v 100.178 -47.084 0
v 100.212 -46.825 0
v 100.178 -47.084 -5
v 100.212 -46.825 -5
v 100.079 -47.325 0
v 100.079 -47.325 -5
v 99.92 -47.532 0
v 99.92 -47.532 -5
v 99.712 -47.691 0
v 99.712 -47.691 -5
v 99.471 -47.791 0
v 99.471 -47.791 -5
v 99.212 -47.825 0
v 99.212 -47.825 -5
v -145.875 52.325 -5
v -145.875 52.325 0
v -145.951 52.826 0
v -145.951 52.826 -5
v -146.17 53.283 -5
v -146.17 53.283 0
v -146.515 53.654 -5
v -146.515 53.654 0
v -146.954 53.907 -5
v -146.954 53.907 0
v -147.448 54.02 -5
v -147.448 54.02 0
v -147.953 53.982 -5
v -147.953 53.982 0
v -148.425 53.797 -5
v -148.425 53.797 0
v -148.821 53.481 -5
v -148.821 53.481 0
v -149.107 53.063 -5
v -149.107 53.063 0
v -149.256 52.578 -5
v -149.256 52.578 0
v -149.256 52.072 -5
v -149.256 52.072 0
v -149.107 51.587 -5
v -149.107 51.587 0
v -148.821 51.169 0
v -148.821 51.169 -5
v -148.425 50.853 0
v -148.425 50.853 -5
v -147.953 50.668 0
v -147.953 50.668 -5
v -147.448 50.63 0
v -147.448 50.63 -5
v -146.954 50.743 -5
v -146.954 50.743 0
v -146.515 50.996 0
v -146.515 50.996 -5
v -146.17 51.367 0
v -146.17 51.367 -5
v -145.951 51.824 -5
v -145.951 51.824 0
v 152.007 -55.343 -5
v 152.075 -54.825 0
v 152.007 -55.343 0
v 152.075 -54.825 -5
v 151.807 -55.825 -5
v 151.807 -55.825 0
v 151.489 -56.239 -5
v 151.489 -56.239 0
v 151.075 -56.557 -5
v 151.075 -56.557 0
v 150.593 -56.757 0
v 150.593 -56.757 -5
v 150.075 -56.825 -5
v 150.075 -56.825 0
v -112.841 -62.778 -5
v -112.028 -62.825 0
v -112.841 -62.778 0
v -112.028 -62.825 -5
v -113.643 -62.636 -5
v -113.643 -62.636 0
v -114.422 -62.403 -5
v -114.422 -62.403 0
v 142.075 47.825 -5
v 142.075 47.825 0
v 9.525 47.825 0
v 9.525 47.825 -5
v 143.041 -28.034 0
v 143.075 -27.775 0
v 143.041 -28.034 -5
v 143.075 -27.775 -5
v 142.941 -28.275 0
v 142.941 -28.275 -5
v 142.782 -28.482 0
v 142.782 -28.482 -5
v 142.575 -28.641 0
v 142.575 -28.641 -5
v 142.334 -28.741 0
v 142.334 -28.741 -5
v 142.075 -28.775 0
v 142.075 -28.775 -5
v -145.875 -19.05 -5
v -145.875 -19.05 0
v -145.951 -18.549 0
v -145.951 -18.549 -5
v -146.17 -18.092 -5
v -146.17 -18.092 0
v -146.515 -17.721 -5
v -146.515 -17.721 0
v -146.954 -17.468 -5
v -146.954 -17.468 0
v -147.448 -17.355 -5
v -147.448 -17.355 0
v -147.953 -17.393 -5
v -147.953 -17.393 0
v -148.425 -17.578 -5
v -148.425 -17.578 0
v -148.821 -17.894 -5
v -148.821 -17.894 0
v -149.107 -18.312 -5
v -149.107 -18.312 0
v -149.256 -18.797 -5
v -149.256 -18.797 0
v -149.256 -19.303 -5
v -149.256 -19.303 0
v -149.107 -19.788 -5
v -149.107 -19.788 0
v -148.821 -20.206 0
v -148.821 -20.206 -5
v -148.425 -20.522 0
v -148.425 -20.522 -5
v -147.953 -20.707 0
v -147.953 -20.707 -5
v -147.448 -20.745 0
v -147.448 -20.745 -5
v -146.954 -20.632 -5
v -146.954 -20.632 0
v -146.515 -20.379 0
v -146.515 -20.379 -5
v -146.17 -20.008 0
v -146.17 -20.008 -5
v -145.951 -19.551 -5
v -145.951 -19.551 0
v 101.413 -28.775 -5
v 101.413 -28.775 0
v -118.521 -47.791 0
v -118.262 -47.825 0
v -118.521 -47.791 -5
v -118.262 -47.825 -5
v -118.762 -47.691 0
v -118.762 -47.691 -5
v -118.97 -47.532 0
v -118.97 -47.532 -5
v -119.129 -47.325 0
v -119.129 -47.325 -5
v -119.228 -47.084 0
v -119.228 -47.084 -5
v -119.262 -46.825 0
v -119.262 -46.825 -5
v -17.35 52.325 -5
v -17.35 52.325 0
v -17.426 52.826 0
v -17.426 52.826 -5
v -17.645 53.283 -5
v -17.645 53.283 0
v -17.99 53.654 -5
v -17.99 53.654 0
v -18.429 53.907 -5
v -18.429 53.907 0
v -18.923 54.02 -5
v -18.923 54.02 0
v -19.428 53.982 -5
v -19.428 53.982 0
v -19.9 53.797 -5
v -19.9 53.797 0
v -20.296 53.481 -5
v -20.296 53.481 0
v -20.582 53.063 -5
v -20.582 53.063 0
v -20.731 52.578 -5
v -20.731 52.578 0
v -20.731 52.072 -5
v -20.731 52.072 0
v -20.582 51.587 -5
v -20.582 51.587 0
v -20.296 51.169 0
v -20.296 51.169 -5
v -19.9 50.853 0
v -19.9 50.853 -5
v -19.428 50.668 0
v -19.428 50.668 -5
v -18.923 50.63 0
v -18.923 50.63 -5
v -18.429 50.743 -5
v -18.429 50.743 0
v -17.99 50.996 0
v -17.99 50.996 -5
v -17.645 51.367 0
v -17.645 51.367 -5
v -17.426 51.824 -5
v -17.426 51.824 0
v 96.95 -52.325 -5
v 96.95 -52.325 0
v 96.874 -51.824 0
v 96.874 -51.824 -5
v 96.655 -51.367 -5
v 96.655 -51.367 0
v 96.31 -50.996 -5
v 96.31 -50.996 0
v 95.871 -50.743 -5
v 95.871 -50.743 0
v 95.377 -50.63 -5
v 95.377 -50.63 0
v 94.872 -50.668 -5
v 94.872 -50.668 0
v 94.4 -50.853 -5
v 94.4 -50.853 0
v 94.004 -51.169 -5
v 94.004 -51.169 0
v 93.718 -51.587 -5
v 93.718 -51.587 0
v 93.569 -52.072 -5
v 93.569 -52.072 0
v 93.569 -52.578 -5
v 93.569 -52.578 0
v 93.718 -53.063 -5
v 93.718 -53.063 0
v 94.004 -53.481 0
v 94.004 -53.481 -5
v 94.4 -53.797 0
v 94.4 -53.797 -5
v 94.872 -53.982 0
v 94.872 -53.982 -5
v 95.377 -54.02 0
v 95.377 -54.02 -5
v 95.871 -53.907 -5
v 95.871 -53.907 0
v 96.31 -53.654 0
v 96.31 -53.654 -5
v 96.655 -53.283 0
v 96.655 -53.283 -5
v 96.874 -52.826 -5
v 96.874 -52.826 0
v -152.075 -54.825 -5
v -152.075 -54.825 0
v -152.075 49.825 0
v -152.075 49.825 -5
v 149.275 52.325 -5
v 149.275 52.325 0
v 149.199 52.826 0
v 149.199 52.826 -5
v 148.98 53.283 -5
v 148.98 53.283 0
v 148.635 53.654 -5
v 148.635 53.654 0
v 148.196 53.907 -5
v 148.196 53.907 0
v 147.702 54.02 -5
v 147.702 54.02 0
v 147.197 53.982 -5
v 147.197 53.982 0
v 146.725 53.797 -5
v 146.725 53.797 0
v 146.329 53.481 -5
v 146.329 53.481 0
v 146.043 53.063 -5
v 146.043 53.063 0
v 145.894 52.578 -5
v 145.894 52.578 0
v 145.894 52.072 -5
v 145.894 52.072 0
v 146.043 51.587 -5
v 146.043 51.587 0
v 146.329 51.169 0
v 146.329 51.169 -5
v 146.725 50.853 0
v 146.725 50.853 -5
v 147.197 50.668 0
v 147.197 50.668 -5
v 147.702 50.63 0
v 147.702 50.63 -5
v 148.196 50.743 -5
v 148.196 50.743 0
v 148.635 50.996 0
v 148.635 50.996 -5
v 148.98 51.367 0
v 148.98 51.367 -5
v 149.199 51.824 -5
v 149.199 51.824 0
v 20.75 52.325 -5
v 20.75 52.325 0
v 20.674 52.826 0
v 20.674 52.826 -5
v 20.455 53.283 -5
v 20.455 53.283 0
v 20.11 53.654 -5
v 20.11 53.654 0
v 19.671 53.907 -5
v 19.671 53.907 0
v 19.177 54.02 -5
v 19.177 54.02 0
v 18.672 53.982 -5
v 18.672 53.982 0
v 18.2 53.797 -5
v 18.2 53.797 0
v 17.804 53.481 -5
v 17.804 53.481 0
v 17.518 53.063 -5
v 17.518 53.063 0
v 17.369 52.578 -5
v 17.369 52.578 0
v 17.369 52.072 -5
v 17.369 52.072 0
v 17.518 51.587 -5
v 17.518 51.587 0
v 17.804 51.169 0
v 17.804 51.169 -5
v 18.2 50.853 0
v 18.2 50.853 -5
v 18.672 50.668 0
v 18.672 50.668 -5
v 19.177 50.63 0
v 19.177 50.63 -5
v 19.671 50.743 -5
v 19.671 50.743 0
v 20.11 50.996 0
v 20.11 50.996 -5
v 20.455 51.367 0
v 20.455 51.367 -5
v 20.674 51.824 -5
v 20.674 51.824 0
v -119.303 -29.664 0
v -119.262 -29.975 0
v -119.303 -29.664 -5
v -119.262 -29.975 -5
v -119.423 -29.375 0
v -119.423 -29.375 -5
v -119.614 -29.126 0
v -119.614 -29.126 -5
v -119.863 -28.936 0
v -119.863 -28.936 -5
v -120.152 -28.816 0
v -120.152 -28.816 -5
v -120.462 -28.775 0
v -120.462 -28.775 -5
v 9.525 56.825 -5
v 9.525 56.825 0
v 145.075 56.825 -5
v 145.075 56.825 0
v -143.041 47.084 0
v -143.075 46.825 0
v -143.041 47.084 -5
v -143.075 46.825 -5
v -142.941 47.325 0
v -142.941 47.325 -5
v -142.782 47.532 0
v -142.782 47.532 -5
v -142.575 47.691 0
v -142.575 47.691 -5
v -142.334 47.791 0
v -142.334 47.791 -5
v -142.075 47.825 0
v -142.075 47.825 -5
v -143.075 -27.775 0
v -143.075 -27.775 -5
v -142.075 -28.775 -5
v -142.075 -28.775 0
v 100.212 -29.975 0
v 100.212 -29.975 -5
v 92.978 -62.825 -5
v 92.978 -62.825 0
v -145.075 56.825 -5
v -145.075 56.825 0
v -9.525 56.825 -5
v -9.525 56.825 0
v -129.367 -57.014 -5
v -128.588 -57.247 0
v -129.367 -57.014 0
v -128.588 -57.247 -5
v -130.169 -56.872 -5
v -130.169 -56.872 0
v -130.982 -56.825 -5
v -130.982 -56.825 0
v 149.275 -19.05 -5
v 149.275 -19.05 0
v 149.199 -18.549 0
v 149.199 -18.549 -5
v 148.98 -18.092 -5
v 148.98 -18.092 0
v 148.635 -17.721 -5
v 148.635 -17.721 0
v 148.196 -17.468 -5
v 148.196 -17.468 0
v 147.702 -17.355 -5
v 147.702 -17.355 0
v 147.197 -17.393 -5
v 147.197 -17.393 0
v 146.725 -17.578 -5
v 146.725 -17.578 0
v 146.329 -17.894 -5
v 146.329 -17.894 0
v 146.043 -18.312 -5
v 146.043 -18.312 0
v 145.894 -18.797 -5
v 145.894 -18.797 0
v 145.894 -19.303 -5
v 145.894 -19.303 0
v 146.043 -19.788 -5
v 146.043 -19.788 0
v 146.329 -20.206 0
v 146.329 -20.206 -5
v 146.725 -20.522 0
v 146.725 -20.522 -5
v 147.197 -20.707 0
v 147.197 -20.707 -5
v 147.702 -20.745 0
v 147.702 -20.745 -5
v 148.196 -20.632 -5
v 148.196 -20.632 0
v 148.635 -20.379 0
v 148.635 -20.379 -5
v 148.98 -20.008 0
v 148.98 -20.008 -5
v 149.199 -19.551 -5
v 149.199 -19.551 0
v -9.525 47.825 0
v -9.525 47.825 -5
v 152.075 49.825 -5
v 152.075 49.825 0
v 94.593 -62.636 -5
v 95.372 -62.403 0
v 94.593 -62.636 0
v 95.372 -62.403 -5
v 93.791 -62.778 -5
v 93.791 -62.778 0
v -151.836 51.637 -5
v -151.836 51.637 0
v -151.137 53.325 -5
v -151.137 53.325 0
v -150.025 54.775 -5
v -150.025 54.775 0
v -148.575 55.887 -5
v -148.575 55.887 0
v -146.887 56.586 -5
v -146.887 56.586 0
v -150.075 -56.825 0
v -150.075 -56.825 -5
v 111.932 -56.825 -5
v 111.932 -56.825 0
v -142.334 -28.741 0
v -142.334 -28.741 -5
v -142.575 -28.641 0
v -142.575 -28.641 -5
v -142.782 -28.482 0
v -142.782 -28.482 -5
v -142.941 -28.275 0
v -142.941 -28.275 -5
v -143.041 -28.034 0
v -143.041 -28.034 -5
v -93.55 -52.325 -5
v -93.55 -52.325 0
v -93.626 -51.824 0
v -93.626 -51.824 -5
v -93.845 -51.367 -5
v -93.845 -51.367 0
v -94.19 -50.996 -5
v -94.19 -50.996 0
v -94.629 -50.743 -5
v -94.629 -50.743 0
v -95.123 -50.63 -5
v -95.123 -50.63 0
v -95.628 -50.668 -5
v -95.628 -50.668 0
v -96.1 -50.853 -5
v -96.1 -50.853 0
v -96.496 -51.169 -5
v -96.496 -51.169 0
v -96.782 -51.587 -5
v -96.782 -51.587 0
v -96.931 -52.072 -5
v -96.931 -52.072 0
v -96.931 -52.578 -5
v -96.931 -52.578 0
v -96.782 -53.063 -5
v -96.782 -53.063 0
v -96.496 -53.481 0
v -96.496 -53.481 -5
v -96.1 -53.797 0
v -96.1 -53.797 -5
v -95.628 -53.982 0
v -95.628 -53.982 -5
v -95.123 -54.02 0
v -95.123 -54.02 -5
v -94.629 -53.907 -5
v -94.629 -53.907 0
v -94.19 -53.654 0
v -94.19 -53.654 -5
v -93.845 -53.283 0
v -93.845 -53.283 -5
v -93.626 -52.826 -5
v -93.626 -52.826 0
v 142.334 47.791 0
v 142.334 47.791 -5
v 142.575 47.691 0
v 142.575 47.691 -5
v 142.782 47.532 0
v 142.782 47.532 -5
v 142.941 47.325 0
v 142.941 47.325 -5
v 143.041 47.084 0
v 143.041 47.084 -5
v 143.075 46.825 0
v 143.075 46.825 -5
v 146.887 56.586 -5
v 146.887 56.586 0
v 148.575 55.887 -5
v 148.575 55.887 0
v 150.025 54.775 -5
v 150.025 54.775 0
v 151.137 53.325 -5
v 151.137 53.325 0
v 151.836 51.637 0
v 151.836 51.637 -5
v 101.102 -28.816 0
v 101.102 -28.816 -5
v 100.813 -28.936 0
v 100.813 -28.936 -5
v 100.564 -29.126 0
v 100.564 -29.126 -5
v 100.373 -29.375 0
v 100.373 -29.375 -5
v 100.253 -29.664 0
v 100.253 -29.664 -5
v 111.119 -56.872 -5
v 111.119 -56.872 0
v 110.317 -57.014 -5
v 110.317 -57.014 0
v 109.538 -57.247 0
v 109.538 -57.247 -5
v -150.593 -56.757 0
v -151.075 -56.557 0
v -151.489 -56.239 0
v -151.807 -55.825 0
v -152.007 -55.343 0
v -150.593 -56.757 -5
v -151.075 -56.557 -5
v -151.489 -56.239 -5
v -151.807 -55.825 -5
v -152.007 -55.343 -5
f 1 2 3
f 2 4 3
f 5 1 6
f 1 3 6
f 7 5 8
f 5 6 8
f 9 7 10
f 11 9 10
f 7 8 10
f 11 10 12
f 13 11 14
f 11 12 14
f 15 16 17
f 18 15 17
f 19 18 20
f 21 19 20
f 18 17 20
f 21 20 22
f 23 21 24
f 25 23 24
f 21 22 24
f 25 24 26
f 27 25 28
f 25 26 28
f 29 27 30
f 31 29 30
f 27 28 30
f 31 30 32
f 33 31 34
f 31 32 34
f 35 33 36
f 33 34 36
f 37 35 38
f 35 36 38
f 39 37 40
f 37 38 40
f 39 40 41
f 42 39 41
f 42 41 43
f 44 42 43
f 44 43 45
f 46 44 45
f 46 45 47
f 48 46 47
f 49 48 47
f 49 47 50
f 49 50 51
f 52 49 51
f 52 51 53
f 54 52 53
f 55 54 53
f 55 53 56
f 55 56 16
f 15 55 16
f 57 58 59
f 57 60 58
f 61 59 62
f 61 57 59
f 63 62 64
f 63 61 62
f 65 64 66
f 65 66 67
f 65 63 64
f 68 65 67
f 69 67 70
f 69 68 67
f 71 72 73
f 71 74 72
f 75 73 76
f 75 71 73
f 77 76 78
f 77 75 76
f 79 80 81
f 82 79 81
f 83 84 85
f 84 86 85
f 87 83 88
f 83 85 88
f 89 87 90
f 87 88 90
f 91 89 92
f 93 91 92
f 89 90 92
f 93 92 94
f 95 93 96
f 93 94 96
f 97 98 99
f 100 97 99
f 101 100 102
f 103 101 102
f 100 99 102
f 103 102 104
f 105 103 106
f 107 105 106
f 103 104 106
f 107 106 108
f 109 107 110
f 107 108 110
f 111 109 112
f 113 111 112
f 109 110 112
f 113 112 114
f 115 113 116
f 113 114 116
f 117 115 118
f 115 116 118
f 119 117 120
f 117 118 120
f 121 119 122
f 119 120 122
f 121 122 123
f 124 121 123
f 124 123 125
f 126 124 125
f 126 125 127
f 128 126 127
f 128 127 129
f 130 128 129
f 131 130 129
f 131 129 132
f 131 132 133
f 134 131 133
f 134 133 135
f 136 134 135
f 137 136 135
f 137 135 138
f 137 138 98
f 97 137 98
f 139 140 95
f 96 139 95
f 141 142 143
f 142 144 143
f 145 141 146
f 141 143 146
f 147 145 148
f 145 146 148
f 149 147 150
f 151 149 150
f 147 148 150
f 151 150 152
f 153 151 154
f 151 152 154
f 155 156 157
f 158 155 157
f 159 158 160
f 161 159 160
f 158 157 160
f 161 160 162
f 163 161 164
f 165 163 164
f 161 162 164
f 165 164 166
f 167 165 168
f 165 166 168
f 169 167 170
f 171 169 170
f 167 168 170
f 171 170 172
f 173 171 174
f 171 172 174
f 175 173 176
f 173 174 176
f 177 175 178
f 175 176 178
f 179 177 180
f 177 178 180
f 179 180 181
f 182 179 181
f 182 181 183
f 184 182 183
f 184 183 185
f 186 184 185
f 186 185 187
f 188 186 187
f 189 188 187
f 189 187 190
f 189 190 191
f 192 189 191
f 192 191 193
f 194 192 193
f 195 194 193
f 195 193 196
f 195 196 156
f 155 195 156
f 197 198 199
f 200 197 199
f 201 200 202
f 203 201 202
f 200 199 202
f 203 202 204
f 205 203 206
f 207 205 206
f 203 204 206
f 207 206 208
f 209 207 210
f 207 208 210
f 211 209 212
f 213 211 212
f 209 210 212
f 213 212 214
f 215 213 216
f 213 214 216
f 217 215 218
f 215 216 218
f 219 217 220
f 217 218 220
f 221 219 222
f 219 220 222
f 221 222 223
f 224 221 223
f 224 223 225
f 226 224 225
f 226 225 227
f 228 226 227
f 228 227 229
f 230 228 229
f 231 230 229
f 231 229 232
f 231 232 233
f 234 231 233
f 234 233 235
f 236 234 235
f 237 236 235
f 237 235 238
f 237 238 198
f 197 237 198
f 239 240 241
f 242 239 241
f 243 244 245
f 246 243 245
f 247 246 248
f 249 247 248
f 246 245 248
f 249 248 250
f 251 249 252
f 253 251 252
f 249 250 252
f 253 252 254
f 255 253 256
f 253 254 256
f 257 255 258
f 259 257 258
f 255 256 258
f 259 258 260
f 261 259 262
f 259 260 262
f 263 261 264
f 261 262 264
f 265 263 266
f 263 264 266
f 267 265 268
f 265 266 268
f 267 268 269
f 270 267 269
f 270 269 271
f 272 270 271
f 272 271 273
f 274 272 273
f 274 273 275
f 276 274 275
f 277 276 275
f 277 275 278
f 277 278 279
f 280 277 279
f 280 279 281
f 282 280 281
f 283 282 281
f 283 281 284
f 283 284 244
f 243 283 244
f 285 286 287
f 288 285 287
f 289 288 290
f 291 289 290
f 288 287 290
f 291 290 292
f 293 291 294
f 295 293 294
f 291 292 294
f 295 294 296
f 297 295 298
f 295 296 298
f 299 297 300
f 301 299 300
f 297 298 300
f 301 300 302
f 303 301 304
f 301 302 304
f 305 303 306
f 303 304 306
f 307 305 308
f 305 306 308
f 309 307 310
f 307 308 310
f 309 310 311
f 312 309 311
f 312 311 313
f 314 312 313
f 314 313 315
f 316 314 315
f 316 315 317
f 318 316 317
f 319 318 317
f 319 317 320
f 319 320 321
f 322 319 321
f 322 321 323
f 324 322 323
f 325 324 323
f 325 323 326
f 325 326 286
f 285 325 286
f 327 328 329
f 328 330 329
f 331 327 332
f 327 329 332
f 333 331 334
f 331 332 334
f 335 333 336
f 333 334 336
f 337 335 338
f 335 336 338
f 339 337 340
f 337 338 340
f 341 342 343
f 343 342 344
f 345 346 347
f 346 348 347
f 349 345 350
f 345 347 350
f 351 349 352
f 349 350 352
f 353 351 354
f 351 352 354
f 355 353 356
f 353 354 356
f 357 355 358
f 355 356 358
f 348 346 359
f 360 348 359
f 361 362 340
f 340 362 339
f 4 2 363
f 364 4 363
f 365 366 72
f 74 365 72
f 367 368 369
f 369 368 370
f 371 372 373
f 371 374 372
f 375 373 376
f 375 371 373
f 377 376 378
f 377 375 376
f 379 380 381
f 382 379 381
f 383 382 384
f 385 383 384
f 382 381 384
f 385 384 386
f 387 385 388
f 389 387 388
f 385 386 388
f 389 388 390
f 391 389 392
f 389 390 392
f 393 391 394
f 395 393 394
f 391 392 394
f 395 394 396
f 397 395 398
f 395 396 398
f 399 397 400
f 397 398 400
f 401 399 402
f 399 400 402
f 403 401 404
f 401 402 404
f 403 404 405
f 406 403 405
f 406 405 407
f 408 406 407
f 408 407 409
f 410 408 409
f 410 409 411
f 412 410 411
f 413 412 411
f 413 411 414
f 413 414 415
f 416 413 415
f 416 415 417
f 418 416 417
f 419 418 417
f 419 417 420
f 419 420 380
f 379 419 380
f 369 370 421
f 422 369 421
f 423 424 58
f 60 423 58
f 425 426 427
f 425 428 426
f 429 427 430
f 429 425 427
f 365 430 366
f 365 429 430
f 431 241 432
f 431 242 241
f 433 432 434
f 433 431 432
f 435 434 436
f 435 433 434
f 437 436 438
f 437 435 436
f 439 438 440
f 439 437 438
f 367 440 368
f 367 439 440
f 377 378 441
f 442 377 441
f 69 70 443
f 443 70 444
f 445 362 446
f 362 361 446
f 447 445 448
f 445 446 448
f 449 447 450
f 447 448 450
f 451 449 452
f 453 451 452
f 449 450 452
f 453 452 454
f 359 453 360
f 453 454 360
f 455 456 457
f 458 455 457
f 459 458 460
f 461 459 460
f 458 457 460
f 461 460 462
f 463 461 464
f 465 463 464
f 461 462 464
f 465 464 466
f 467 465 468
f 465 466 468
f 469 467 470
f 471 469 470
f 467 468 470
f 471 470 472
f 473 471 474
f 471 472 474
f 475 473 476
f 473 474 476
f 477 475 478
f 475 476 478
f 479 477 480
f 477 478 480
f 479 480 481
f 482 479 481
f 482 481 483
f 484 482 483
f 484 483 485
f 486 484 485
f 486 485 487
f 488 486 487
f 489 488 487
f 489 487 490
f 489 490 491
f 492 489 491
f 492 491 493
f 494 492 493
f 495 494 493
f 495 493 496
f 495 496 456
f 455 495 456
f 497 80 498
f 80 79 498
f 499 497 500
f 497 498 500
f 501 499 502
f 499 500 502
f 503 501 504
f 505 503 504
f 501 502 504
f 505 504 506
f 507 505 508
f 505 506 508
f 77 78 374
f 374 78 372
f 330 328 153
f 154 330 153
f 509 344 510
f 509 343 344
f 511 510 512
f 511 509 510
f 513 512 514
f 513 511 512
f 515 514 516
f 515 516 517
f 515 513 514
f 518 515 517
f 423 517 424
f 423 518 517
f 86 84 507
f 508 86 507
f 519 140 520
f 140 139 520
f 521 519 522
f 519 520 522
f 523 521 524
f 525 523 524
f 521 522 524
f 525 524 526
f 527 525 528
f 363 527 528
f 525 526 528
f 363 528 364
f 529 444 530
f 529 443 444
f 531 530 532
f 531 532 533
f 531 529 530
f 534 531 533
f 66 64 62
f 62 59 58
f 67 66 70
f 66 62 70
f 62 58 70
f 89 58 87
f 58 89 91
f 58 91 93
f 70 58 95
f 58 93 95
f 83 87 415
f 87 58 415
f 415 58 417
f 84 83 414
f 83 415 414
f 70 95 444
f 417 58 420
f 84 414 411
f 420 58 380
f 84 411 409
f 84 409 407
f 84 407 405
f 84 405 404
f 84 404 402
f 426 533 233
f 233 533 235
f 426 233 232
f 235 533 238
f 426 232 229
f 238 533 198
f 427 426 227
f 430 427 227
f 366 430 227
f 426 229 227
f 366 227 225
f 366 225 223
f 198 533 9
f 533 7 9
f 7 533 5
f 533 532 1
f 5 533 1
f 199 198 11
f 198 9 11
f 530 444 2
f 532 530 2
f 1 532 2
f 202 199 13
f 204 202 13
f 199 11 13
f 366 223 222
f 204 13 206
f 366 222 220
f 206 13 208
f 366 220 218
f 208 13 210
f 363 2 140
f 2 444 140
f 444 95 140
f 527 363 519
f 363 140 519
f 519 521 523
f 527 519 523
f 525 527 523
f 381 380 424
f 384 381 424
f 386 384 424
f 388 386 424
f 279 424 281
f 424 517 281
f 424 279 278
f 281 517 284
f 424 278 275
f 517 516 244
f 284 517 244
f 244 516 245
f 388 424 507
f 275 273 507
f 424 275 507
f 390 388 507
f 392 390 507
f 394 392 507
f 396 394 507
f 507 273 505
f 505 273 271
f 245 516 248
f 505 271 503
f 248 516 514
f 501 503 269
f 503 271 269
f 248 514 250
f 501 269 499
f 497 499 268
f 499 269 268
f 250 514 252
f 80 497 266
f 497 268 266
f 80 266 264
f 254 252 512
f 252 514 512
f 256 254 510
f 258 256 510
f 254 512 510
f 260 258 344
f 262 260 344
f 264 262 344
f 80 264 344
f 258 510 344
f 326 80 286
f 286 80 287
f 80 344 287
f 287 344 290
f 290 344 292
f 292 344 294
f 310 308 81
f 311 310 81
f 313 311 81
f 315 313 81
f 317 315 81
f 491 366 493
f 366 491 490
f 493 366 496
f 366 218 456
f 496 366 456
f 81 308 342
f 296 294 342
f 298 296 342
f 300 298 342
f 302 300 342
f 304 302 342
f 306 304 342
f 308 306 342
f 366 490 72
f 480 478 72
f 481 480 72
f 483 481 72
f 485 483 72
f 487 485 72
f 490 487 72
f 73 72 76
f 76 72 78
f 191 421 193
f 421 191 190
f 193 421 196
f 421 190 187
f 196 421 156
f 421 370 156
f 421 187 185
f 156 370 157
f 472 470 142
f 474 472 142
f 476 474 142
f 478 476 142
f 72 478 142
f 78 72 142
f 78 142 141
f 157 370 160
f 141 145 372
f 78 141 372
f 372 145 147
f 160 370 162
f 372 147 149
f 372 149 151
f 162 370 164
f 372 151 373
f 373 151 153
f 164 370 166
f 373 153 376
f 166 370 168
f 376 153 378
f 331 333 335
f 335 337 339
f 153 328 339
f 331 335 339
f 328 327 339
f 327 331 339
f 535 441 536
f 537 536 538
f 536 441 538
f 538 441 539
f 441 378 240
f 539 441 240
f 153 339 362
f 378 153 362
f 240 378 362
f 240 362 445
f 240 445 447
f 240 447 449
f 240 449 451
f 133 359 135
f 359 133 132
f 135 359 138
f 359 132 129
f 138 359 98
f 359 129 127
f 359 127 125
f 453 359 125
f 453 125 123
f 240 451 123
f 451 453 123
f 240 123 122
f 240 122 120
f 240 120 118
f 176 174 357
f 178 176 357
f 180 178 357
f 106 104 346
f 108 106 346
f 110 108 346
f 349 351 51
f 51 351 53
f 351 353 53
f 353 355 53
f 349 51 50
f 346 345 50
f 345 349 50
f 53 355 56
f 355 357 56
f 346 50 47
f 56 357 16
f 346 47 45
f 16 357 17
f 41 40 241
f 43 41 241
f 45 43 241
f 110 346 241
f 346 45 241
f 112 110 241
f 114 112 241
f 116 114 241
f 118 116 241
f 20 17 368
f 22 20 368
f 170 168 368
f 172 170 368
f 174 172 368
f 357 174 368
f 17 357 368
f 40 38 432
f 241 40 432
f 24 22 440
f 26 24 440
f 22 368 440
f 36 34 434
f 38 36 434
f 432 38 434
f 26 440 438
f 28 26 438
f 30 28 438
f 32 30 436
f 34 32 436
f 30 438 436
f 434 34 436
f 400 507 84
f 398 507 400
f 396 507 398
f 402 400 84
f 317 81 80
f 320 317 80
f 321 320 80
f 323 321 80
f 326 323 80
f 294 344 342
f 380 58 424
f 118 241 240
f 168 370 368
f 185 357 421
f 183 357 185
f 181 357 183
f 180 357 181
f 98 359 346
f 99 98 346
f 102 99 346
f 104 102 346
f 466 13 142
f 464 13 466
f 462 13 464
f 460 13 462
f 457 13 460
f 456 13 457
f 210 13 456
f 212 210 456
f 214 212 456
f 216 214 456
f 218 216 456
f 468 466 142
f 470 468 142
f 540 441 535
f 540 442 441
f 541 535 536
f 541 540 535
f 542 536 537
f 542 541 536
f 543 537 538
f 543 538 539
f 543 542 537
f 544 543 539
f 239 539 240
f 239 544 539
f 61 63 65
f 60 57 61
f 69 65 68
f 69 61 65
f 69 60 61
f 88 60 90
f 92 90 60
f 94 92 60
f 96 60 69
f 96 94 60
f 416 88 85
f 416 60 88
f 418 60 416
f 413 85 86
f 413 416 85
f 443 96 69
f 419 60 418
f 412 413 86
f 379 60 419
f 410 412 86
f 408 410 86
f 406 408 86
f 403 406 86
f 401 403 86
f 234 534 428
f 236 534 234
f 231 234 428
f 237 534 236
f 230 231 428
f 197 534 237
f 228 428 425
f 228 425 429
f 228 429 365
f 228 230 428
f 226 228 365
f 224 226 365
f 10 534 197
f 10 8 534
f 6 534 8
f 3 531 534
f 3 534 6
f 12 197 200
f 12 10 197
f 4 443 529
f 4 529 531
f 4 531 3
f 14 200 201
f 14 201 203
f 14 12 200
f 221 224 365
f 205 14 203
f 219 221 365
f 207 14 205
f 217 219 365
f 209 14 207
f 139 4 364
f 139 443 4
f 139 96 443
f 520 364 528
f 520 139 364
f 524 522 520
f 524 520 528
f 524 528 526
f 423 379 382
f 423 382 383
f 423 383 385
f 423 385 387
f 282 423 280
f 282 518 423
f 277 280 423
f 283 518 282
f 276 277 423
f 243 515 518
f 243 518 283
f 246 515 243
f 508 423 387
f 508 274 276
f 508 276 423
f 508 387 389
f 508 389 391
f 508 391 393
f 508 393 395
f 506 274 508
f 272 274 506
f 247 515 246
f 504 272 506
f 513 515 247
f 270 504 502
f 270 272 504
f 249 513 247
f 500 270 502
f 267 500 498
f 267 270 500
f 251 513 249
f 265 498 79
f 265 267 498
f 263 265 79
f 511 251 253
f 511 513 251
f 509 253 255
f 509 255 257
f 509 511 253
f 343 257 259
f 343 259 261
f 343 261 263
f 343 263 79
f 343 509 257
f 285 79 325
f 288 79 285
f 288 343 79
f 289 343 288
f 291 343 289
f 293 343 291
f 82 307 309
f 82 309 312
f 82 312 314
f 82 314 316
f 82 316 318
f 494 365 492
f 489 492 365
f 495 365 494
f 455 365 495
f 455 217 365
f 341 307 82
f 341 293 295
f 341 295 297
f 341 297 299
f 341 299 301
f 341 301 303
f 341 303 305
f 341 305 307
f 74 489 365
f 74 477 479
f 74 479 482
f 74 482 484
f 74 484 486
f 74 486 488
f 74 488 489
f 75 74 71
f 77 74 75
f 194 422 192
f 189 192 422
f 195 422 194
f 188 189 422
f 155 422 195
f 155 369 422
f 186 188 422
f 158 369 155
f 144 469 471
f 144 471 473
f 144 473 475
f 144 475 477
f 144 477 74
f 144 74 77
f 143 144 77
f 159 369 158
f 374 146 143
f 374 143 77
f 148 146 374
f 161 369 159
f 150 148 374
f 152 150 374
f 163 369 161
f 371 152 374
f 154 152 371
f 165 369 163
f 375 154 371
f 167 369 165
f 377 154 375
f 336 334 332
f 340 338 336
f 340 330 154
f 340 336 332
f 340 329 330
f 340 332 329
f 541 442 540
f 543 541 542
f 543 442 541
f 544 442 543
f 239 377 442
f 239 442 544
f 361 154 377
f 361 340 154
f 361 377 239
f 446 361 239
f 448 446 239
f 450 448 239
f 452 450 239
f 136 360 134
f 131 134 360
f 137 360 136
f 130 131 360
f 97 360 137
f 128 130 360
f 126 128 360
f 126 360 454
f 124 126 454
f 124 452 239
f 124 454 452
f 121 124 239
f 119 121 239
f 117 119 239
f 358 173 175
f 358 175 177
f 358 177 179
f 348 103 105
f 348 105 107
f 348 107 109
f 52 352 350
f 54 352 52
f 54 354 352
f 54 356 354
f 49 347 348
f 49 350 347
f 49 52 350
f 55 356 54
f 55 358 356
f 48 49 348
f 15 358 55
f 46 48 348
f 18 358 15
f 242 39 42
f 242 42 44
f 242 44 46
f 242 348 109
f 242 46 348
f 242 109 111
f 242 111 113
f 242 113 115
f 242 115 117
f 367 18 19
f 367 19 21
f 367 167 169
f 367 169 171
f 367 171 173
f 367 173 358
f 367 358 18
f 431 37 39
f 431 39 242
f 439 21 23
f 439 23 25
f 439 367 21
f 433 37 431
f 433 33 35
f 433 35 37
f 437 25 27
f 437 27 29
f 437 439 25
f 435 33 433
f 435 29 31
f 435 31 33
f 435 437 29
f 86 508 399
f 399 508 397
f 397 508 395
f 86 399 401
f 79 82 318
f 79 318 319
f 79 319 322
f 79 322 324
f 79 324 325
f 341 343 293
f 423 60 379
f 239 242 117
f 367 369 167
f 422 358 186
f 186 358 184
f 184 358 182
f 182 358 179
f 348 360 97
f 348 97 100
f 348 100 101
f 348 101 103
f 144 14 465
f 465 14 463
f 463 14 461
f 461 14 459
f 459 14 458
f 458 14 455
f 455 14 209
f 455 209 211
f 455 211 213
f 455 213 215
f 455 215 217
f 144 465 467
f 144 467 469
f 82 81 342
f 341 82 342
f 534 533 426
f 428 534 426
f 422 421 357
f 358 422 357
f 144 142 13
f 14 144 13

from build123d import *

# Parameters (mm, degrees)
PAD001_DEPTH  = 5
FILLET004_R   = 7
FILLET013_R   = 2
FILLET005_R   = 1
FILLET006_R   = 1.2
SKETCH014_R   = 1.7
HOLE003_DEPTH = 25


with BuildPart() as part:
    # Sketch001 → Pad001 (new body)
    with BuildSketch(Plane.XY):
        Polygon((-9.525, 56.825), (-9.525, 47.825), (-143.075, 47.825), (-143.075, -28.775), (-119.2625, -28.775), (-119.2625, -47.825), (100.2125, -47.825), (100.2125, -28.775), (143.075, -28.775), (143.075, 47.825), (9.525, 47.825), (9.525, 56.825), (152.075, 56.825), (152.075, -56.825), (110.697365, -56.825), (94.2125, -62.825), (-113.2625, -62.825), (-129.747365, -56.825), (-152.075, -56.825), (-152.075, 56.825), align=None)
    extrude(amount=-PAD001_DEPTH)

    # Fillet004
    fillet004_edges = [part.edges().sort_by_distance(p)[0] for p in [
        (152.075, 56.825, -2.5),
        (-152.075, 56.825, -2.5),
        (-129.747365, -56.825, -2.5),
        (-113.2625, -62.825, -2.5),
        (94.2125, -62.825, -2.5),
        (110.697365, -56.825, -2.5),
    ]]
    fillet(fillet004_edges, radius=FILLET004_R)

    # Fillet013
    fillet013_edges = [part.edges().sort_by_distance(p)[0] for p in [
        (-152.075, -56.825, -2.5),
        (152.075, -56.825, -2.5),
    ]]
    fillet(fillet013_edges, radius=FILLET013_R)

    # Fillet005
    fillet005_edges = [part.edges().sort_by_distance(p)[0] for p in [
        (143.075, 47.825, -2.5),
        (-143.075, 47.825, -2.5),
        (-143.075, -28.775, -2.5),
        (-119.2625, -47.825, -2.5),
        (100.2125, -47.825, -2.5),
        (143.075, -28.775, -2.5),
    ]]
    fillet(fillet005_edges, radius=FILLET005_R)

    # Fillet006
    fillet006_edges = [part.edges().sort_by_distance(p)[0] for p in [
        (100.2125, -28.775, -2.5),
        (-119.2625, -28.775, -2.5),
    ]]
    fillet(fillet006_edges, radius=FILLET006_R)

    # Sketch014 (on Face1 of Fillet006) → Hole003 (cut)
    with BuildSketch(Plane.XY):
        with Locations((147.575, 52.325)):
            Circle(SKETCH014_R)
        with Locations((147.575, -19.05)):
            Circle(SKETCH014_R)
        with Locations((95.25, -52.325)):
            Circle(SKETCH014_R)
        with Locations((-95.25, -52.325)):
            Circle(SKETCH014_R)
        with Locations((-147.575, -19.05)):
            Circle(SKETCH014_R)
        with Locations((-147.575, 52.325)):
            Circle(SKETCH014_R)
        with Locations((-19.05, 52.325)):
            Circle(SKETCH014_R)
        with Locations((19.05, 52.325)):
            Circle(SKETCH014_R)
    extrude(amount=-HOLE003_DEPTH, mode=Mode.SUBTRACT)


solid = part.part
